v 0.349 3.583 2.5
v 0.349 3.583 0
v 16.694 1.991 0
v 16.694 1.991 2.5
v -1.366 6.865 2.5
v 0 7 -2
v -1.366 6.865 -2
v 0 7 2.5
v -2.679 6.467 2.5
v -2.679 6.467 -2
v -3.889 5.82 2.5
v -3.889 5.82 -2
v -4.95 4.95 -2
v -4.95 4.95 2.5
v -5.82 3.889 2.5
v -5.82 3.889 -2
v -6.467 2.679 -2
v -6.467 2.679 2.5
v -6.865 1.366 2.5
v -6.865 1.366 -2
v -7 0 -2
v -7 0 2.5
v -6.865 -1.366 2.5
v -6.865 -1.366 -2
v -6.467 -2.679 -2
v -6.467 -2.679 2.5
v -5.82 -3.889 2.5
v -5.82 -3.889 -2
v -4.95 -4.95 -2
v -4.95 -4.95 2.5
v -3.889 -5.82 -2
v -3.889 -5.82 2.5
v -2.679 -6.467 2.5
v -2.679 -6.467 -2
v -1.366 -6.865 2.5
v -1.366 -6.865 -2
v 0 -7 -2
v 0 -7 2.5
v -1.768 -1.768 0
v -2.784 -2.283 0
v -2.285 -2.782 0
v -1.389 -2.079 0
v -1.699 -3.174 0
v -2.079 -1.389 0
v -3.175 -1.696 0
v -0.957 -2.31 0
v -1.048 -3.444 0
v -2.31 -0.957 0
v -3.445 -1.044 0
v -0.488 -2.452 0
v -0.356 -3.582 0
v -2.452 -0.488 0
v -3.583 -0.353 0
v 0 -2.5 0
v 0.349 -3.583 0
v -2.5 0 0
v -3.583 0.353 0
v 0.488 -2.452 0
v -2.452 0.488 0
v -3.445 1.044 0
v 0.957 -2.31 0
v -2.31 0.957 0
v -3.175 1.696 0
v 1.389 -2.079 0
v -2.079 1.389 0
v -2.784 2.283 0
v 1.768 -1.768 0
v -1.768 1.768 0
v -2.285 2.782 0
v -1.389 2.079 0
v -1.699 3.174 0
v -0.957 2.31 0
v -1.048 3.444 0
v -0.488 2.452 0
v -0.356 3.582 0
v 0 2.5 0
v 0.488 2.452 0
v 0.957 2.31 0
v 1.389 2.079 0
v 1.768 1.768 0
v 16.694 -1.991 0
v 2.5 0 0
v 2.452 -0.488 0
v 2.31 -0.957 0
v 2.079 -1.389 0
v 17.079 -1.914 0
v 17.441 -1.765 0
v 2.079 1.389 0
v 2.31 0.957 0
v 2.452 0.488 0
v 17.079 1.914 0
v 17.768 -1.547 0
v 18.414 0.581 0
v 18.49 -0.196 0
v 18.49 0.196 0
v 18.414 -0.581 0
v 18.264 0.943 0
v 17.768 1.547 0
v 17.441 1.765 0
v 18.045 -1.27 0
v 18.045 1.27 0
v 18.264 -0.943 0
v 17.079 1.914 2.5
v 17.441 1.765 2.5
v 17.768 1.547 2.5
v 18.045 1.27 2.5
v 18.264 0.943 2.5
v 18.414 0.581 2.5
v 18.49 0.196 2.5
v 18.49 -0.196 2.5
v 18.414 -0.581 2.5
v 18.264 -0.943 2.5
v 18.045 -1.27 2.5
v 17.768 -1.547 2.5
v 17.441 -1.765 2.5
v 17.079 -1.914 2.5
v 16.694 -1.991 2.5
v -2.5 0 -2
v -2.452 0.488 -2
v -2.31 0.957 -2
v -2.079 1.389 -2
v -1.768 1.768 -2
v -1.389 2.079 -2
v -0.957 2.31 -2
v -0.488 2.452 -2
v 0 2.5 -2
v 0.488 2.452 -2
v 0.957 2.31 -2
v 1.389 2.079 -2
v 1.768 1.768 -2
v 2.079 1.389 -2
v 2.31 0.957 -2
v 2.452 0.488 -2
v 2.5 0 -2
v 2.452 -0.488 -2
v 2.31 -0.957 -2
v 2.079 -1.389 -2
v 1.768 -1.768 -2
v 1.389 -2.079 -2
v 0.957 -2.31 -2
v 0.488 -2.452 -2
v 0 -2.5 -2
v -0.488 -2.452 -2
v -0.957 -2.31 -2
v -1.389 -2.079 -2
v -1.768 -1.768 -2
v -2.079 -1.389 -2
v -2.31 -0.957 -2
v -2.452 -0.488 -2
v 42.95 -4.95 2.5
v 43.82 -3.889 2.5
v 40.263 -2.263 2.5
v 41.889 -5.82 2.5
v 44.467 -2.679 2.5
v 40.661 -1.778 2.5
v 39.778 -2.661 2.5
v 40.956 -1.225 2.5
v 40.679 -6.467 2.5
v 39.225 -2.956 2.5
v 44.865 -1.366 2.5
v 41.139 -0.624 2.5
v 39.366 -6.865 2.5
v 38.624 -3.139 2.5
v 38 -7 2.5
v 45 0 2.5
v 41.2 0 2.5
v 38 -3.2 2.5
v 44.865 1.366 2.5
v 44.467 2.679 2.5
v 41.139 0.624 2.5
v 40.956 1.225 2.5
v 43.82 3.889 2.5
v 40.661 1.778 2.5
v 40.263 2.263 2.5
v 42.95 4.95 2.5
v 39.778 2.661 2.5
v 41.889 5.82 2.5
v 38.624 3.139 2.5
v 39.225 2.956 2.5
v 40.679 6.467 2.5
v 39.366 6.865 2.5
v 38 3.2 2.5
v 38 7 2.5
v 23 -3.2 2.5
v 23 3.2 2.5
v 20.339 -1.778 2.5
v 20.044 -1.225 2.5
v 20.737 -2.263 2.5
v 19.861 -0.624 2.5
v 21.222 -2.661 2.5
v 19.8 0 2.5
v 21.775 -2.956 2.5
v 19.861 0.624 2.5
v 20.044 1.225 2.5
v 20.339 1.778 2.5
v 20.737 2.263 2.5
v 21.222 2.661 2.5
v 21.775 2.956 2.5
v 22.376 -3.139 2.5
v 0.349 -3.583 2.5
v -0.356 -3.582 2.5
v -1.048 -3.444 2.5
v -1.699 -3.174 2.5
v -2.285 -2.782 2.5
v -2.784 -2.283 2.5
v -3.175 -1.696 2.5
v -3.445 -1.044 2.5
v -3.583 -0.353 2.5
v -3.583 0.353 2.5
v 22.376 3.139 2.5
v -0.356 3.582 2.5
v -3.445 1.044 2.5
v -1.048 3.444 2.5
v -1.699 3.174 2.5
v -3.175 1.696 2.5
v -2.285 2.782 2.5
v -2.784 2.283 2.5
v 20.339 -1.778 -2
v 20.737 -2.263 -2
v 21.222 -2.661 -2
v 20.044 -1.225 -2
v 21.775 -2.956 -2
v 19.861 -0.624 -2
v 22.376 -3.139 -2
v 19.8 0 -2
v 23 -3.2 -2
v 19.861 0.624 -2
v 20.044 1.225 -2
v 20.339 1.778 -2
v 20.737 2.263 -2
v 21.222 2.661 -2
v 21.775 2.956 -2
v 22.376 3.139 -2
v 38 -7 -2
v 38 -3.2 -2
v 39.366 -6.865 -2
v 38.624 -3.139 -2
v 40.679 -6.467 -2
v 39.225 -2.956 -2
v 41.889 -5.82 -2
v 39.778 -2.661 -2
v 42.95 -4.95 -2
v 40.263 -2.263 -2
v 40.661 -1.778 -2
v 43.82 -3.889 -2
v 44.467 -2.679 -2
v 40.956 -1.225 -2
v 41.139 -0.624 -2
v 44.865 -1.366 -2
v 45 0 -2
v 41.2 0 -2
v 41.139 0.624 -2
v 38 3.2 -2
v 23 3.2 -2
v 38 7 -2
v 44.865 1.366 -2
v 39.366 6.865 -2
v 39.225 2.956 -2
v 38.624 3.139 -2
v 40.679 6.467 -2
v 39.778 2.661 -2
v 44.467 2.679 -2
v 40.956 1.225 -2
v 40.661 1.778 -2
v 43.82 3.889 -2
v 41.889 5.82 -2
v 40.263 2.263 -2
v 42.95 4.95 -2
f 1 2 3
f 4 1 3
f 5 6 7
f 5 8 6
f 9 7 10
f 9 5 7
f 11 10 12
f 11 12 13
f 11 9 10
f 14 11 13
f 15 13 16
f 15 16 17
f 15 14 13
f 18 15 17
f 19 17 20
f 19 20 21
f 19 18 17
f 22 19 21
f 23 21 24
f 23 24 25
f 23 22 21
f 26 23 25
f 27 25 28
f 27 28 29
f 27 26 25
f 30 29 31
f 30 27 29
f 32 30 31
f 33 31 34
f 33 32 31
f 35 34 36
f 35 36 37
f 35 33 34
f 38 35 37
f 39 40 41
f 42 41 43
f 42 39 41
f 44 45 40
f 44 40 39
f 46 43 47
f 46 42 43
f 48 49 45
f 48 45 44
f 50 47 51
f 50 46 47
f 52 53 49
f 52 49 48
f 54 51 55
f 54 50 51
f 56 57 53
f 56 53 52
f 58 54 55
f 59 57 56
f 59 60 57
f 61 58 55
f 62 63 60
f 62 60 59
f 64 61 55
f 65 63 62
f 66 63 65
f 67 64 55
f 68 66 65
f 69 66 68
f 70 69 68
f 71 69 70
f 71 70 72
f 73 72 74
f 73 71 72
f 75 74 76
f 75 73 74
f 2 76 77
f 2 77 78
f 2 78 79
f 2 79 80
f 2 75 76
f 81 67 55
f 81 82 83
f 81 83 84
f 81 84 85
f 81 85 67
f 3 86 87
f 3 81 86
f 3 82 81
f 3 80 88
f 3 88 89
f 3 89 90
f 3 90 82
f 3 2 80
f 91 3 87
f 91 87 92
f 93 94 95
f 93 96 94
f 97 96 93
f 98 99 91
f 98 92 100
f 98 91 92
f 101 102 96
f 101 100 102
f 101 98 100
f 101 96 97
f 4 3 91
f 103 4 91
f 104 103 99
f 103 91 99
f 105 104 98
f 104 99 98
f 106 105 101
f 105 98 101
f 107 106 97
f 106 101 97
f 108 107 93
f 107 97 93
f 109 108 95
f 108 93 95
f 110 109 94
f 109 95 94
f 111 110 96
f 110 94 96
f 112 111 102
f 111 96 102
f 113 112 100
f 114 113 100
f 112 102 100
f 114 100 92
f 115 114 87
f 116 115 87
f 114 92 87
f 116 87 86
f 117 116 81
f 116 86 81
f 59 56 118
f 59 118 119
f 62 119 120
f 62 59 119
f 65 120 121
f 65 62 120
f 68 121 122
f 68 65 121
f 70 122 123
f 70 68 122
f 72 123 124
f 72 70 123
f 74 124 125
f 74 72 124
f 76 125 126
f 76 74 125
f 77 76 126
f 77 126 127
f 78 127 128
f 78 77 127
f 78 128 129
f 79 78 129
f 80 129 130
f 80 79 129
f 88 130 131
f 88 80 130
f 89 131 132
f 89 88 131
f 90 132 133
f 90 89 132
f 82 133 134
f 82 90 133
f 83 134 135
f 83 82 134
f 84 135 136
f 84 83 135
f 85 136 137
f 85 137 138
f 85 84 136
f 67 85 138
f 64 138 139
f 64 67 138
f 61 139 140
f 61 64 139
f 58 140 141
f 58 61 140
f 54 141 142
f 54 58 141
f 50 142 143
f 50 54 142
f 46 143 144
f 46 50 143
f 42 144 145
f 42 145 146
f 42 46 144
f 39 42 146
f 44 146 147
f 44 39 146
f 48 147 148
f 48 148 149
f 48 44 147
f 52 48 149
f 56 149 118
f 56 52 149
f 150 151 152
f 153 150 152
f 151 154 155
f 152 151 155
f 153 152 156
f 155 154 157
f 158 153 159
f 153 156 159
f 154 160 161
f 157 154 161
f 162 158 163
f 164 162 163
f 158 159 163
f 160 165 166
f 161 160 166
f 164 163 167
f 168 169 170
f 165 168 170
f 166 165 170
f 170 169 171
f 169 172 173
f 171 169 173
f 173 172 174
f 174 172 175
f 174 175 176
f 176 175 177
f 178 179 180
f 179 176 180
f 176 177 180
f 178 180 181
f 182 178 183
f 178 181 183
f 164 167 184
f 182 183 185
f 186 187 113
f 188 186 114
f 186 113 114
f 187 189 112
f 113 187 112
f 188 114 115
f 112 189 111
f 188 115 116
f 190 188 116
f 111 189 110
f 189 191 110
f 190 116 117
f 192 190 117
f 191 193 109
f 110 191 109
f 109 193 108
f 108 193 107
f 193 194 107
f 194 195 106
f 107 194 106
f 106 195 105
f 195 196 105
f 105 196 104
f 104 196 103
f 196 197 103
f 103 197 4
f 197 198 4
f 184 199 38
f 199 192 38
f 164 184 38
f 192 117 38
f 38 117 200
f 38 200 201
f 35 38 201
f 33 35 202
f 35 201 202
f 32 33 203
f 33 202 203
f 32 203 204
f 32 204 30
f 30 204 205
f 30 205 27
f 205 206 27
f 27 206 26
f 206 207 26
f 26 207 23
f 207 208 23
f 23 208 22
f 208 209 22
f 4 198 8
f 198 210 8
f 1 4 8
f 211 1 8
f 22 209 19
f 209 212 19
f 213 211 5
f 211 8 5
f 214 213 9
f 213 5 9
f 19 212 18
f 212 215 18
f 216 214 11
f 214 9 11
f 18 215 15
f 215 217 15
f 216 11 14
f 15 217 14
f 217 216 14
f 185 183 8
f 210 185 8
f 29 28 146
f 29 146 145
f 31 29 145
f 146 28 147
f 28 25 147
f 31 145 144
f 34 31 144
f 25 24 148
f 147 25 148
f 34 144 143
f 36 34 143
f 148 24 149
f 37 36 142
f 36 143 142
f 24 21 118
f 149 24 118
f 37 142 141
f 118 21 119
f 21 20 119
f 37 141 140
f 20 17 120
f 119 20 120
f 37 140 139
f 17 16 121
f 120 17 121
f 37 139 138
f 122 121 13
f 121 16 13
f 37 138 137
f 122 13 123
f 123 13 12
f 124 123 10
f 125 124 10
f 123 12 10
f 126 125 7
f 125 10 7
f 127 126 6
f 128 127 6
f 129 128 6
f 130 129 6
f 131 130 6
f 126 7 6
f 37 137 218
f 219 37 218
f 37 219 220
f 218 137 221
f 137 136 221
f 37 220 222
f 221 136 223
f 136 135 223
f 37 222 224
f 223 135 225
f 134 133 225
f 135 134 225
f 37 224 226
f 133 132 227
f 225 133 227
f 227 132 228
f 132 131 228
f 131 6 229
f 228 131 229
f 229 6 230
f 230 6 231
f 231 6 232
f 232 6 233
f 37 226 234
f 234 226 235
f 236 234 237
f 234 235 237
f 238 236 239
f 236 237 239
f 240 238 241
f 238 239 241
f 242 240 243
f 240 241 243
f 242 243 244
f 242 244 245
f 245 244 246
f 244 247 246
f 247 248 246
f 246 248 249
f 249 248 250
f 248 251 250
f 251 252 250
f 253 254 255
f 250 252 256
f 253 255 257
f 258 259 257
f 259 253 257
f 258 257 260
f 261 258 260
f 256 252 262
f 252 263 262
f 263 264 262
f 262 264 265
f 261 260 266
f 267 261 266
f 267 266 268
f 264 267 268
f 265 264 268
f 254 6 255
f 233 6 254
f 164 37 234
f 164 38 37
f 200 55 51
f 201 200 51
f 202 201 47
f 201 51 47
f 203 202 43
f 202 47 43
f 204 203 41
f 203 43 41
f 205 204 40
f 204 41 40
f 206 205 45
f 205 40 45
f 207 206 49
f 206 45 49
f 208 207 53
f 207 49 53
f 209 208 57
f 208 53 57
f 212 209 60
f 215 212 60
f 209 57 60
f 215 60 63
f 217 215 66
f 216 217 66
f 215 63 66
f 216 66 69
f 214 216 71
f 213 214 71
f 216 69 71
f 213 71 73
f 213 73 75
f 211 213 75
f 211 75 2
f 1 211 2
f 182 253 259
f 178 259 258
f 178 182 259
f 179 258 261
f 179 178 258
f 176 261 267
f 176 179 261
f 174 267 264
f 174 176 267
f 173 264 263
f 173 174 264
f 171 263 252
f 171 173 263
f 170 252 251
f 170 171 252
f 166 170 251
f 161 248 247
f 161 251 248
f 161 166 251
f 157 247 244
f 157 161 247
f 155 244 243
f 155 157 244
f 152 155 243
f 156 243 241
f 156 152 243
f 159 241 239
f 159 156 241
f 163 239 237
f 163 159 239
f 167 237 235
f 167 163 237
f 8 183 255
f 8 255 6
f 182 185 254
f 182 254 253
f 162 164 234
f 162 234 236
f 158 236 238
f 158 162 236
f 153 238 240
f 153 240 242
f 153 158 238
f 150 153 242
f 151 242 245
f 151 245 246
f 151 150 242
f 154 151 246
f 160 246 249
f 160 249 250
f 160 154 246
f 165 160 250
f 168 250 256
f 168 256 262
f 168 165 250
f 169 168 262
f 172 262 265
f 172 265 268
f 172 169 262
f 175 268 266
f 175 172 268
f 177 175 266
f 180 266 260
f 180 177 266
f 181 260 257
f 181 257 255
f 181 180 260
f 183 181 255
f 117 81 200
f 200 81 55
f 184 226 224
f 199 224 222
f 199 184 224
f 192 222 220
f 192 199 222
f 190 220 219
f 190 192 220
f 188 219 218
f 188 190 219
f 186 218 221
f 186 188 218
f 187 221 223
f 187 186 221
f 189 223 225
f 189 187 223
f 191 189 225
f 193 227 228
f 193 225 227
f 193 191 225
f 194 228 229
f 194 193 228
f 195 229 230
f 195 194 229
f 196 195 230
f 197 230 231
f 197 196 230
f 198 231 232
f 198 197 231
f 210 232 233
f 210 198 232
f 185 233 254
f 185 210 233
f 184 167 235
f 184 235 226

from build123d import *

# Parameters (mm, degrees)
MAIN_DEPTH            = 2.5
ESQUISSE2_R           = 2.5
ORIGINALBRACKET_DEPTH = 2
CUT_EXTRUDE1_DEPTH    = 3


with BuildPart() as part:
    # Esquisse1 → Main (new body)
    with BuildSketch(Plane.XY):
        with BuildLine():
            Line((0, 7), (38, 7))
            ThreePointArc((38, 7), (45, 0), (38, -7))
            Line((38, -7), (0, -7))
            ThreePointArc((0, -7), (-7, 0), (0, 7))
        make_face()
        with BuildLine():
            Line((0.349090909, 3.583034404), (16.693939394, 1.990574669))
            ThreePointArc((16.693939394, 1.990574669), (18.5, 0), (16.693939394, -1.990574669))
            Line((16.693939394, -1.990574669), (0.349090909, -3.583034404))
            ThreePointArc((0.349090909, -3.583034404), (-3.6, 0), (0.349090909, 3.583034404))
        make_face(mode=Mode.SUBTRACT)
        with BuildLine():
            Line((23, 3.2), (38, 3.2))
            ThreePointArc((38, 3.2), (41.2, 0), (38, -3.2))
            Line((38, -3.2), (23, -3.2))
            ThreePointArc((23, -3.2), (19.8, 0), (23, 3.2))
        make_face(mode=Mode.SUBTRACT)
    extrude(amount=MAIN_DEPTH)

    # Esquisse2 → OriginalBracket (add)
    with BuildSketch(Plane(origin=(0, 0, 0), x_dir=(-1, 0, 0), z_dir=(0, 0, -1))):
        with BuildLine():
            Line((0, -7), (-38, -7))
            ThreePointArc((-38, -7), (-45, 0), (-38, 7))
            Line((-38, 7), (0, 7))
            ThreePointArc((0, 7), (7, 0), (0, -7))
        make_face()
        Circle(ESQUISSE2_R, mode=Mode.SUBTRACT)
    extrude(amount=ORIGINALBRACKET_DEPTH)

    # Sketch1 → Cut-Extrude1 (cut, through all)
    with BuildSketch(Plane.XY):
        with BuildLine():
            Line((23, 3.2), (38, 3.2))
            ThreePointArc((38, 3.2), (41.2, 0), (38, -3.2))
            Line((38, -3.2), (23, -3.2))
            ThreePointArc((23, -3.2), (19.8, 0), (23, 3.2))
        make_face()
    extrude(amount=-CUT_EXTRUDE1_DEPTH, mode=Mode.SUBTRACT)


solid = part.part
